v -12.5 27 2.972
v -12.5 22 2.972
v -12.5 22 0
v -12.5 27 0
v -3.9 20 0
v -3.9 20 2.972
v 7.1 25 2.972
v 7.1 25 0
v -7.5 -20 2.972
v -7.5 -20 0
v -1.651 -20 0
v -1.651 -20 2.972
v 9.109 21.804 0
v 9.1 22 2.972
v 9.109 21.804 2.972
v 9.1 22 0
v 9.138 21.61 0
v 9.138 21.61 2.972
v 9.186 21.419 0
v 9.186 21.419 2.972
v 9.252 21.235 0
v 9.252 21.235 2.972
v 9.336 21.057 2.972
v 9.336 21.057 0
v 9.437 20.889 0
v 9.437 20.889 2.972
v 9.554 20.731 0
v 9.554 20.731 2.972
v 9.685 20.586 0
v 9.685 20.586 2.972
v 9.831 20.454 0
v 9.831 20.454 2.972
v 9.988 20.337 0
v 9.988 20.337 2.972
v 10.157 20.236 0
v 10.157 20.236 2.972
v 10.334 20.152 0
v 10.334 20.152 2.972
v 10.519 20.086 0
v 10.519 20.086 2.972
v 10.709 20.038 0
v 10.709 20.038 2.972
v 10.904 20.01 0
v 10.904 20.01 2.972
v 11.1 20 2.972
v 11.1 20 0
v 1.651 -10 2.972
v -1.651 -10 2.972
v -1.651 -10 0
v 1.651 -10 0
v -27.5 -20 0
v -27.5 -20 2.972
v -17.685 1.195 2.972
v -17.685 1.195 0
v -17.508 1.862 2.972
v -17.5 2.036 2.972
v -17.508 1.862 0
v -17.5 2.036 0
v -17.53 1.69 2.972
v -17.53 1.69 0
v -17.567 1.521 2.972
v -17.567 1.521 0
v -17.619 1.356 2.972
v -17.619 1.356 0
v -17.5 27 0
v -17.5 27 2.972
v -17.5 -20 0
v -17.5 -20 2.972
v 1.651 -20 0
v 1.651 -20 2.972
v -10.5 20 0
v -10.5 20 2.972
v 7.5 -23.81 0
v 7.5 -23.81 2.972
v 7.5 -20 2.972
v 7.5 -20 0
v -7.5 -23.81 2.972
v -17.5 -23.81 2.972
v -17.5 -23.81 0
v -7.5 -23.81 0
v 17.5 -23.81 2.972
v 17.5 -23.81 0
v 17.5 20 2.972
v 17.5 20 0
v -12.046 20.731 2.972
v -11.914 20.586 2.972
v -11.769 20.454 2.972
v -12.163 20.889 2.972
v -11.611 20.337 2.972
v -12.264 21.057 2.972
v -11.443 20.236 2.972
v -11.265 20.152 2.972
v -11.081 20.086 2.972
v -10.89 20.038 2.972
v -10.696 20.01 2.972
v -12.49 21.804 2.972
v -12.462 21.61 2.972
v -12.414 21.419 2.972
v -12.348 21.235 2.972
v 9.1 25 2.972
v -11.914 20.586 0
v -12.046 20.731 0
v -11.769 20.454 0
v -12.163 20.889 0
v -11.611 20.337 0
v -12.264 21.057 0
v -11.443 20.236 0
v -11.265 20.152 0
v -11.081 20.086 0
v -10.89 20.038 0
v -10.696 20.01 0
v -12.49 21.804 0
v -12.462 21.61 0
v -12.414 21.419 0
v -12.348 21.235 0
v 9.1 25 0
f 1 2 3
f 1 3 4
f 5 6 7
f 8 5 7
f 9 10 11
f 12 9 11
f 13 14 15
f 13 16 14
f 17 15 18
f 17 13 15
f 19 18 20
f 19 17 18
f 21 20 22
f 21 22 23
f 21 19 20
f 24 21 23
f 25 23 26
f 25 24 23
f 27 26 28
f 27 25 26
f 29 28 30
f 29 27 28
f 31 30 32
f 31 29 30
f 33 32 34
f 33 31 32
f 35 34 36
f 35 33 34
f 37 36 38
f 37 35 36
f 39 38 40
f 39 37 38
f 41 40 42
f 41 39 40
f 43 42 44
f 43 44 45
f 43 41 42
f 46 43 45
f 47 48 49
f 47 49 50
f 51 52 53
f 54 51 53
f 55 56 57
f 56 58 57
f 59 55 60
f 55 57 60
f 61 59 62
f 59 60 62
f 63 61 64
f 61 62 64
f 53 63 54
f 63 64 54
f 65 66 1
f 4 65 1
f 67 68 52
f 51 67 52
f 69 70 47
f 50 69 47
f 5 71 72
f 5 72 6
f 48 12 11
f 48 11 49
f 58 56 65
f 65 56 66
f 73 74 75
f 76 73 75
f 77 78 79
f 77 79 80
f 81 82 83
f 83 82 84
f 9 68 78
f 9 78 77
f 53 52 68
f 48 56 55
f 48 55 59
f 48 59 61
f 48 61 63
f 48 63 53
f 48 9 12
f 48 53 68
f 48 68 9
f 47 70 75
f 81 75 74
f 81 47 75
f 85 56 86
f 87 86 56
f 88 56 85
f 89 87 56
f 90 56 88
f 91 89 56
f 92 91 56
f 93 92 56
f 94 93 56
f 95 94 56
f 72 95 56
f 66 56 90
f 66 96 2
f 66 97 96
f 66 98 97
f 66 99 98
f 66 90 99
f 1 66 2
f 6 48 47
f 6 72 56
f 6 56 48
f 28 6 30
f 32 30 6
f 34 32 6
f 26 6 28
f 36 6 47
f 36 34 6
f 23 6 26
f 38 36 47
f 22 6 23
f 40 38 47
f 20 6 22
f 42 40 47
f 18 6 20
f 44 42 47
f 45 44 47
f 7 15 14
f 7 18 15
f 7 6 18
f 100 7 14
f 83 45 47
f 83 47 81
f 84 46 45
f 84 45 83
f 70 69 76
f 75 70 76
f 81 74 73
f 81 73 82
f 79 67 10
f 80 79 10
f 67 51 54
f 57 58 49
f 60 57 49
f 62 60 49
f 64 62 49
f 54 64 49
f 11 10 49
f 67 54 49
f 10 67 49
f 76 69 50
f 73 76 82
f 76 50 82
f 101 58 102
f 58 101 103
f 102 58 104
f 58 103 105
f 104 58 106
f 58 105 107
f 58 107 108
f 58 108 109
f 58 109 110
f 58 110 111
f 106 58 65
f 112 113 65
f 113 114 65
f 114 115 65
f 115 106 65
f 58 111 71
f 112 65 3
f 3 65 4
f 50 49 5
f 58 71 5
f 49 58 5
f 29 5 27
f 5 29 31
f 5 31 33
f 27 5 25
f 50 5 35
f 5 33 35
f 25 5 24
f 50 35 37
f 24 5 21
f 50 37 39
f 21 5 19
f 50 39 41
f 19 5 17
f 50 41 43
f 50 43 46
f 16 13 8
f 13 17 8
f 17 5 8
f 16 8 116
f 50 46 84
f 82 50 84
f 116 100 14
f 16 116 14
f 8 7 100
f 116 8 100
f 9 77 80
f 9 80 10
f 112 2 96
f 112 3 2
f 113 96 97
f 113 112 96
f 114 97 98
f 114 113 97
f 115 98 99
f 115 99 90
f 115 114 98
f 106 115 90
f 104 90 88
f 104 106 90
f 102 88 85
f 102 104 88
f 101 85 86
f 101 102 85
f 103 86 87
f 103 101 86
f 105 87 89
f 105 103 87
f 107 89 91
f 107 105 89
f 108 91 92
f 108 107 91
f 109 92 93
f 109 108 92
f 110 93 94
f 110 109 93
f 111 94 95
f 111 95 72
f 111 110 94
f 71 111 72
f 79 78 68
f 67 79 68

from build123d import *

# Parameters (mm, degrees)
SKETCH1_W           = 35
SKETCH1_H           = 40
BOSS_EXTRUDE1_DEPTH = 2.9718
SKETCH2_W           = 5
SKETCH2_H           = 7
SKETCH2_W_2         = 10
SKETCH2_H_2         = 3.81
BOSS_EXTRUDE2_DEPTH = 2.9718
BOSS_EXTRUDE3_DEPTH = 2.9718
FILLET1_R           = 2
FILLET2_R           = 2
FILLET3_R           = 2
SKETCH4_W           = 3.302
SKETCH4_H           = 10
CUT_EXTRUDE1_DEPTH  = 3.9718


with BuildPart() as part:
    # Sketch1 → Boss-Extrude1 (new body)
    with BuildSketch(Plane.XY):
        Rectangle(SKETCH1_W, SKETCH1_H)
    extrude(amount=BOSS_EXTRUDE1_DEPTH)

    # Sketch2 → Boss-Extrude2 (add)
    with BuildSketch(Plane.XY.offset(2.9718)):
        Polygon((-3.900430119, 20), (7.099569881, 25), (9.099569881, 25), (9.099569881, 20), align=None)
        with Locations((-15, 23.5)):
            Rectangle(SKETCH2_W, SKETCH2_H)
        with Locations((-12.5, -21.905)):
            Rectangle(SKETCH2_W_2, SKETCH2_H_2)
        with Locations((12.5, -21.905)):
            Rectangle(SKETCH2_W_2, SKETCH2_H_2)
    extrude(amount=-BOSS_EXTRUDE2_DEPTH)

    # Sketch3 → Boss-Extrude3 (add)
    with BuildSketch(Plane.XY.offset(2.9718)):
        Polygon((-17.5, -20), (-27.5, -20), (-17.5, 1.595), align=None)
    extrude(amount=-BOSS_EXTRUDE3_DEPTH)

    # Fillet1
    fillet1_edges = [part.edges().sort_by_distance(p)[0] for p in [
        (-12.5, 20, 1.4859),
    ]]
    fillet(fillet1_edges, radius=FILLET1_R)

    # Fillet2
    fillet2_edges = [part.edges().sort_by_distance(p)[0] for p in [
        (9.099569881, 20, 1.4859),
    ]]
    fillet(fillet2_edges, radius=FILLET2_R)

    # Fillet3
    fillet3_edges = [part.edges().sort_by_distance(p)[0] for p in [
        (-17.5, 1.595, 1.4859),
    ]]
    fillet(fillet3_edges, radius=FILLET3_R)

    # Sketch4 → Cut-Extrude1 (cut, through all)
    with BuildSketch(Plane.XY.offset(2.9718)):
        with Locations((0, -15)):
            Rectangle(SKETCH4_W, SKETCH4_H)
    extrude(amount=-CUT_EXTRUDE1_DEPTH, mode=Mode.SUBTRACT)


solid = part.part
